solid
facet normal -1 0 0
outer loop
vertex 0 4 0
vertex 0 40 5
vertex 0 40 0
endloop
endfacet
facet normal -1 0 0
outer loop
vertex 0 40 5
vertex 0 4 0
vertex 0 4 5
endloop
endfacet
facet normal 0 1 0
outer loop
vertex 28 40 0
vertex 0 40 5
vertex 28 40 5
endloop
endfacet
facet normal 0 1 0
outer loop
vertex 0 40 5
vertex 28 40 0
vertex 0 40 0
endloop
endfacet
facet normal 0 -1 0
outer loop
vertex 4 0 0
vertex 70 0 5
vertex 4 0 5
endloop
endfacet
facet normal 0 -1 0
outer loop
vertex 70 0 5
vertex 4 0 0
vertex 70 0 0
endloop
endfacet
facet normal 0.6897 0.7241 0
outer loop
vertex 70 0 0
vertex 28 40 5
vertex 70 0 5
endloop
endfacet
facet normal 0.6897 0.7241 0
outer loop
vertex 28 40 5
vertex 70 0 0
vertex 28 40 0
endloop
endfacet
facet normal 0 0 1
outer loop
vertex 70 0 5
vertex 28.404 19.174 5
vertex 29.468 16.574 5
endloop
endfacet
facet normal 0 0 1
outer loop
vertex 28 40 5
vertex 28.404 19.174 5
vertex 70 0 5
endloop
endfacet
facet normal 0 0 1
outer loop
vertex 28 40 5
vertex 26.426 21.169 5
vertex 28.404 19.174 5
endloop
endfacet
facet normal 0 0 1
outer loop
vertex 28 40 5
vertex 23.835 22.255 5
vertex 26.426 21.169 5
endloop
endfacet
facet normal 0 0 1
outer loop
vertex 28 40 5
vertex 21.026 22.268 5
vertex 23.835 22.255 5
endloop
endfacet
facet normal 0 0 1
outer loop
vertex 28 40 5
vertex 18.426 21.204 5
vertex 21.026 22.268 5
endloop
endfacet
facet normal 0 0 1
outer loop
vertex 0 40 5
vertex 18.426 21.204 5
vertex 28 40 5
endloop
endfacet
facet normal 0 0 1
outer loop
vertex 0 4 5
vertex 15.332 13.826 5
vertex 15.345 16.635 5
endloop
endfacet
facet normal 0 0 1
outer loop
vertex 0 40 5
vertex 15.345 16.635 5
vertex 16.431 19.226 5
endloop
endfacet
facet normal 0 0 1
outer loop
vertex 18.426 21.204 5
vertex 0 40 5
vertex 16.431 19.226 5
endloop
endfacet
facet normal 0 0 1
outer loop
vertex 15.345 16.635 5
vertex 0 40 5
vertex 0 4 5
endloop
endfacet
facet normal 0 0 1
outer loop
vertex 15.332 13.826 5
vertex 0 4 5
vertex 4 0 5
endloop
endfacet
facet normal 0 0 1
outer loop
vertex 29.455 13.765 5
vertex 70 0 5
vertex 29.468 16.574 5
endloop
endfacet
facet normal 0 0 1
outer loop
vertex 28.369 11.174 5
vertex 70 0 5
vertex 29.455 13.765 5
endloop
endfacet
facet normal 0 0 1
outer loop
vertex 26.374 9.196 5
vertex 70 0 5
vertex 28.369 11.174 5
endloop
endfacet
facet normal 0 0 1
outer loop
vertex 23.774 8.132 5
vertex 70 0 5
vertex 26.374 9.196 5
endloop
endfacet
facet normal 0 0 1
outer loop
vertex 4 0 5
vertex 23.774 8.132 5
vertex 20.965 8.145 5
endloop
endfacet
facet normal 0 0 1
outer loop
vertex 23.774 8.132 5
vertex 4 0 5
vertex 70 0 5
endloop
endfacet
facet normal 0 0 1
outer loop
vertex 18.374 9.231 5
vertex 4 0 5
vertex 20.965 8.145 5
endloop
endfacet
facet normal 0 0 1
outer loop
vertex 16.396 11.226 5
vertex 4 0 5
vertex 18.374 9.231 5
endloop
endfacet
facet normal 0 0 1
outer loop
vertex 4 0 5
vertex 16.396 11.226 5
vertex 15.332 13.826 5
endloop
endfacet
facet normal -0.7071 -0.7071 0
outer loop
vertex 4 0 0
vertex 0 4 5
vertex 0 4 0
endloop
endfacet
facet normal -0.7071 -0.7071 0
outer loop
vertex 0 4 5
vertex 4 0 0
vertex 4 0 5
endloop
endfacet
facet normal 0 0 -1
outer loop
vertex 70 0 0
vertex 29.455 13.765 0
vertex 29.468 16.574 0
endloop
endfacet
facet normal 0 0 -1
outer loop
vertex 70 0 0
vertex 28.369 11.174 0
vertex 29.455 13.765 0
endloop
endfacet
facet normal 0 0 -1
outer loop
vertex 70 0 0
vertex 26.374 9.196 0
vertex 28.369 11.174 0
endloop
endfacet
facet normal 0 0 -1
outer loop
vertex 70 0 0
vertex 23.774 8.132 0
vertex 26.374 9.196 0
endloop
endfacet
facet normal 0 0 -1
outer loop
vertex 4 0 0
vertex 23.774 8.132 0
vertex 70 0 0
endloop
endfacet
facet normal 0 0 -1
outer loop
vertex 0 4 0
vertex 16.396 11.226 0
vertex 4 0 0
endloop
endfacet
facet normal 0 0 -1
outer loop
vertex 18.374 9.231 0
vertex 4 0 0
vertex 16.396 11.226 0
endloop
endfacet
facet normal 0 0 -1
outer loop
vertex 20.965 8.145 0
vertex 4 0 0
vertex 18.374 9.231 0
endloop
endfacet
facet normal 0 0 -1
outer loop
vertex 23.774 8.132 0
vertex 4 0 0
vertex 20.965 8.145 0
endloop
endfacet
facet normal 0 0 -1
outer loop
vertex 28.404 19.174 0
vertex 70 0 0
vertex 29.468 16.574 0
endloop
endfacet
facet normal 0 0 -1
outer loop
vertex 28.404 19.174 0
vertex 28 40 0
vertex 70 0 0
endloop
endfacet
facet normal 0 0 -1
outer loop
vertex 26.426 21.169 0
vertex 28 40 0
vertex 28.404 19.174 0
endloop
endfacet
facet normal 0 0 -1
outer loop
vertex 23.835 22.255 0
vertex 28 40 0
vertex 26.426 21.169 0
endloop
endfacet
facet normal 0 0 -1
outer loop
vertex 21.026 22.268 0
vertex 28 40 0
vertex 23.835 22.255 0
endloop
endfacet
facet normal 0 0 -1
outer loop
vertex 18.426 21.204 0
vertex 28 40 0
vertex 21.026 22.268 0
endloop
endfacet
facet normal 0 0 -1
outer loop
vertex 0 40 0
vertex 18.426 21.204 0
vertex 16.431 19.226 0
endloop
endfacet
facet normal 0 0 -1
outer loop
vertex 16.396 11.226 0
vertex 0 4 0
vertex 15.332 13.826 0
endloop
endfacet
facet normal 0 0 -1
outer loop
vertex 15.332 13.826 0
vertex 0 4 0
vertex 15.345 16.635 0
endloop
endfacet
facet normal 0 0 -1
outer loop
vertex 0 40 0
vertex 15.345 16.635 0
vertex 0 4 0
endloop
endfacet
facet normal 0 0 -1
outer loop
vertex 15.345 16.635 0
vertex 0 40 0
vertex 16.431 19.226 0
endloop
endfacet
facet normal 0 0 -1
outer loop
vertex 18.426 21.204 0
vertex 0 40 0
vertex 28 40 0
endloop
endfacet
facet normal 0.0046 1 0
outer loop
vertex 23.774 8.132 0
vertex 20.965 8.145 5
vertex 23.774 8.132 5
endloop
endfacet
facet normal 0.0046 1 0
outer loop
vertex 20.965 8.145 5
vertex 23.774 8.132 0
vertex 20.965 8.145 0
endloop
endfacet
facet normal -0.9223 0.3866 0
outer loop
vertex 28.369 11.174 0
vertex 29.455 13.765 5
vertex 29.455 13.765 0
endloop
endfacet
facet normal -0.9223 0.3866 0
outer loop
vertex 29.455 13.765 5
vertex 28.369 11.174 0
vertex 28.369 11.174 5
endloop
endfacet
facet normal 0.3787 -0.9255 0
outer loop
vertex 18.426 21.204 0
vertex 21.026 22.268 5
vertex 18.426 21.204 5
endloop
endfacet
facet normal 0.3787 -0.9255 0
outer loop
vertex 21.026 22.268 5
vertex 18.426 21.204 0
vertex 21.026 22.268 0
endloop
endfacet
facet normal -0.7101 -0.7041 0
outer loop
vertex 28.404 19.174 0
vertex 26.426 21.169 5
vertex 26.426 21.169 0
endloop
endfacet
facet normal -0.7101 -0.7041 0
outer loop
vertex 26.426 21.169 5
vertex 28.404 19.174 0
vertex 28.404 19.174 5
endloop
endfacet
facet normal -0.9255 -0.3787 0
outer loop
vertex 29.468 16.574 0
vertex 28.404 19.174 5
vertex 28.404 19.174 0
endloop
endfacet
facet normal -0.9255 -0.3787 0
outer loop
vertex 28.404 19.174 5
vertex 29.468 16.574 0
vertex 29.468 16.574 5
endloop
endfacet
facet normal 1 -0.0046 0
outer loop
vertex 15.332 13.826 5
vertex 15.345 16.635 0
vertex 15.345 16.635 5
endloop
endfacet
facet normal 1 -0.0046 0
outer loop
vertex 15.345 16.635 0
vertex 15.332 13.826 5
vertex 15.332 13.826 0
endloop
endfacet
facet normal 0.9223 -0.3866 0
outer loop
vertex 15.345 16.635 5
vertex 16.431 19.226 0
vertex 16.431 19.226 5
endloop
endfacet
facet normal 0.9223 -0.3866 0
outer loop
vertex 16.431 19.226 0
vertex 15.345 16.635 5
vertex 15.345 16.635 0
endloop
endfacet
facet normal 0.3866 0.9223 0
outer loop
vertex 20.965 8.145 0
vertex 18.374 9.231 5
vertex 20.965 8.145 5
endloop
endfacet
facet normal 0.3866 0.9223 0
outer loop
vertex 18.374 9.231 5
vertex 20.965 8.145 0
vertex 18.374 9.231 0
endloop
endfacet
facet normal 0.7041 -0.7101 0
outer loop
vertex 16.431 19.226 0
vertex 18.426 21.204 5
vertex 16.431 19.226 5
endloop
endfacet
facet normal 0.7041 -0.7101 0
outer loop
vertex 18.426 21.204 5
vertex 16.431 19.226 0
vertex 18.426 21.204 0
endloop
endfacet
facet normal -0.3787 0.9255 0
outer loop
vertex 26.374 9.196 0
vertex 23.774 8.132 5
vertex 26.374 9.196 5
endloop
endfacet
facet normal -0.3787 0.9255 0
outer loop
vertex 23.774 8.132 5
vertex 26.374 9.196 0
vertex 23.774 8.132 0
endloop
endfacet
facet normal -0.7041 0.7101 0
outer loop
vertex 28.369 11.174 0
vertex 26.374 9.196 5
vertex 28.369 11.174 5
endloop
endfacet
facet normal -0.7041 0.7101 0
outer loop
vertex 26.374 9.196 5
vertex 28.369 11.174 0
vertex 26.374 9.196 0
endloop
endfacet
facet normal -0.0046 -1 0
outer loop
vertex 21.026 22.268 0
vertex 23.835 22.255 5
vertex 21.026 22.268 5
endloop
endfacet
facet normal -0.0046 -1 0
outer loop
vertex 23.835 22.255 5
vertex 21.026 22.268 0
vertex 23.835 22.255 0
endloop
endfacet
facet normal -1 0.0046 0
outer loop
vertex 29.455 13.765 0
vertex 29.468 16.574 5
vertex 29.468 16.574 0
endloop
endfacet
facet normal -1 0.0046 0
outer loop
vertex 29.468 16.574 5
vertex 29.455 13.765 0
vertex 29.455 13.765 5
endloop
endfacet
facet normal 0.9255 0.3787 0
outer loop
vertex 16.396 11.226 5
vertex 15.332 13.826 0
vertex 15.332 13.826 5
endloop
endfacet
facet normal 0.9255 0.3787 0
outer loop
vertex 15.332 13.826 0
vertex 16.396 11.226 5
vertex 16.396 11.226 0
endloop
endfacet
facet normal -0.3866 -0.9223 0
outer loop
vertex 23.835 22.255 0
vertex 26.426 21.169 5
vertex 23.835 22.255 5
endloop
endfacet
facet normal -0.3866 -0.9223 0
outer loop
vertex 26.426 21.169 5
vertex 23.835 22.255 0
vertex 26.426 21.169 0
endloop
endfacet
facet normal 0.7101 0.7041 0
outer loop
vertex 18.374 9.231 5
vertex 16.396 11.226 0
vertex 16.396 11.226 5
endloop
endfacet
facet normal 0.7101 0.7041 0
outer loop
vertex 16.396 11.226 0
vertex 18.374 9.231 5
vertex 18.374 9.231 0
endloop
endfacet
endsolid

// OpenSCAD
$fn = 32;

// ----------------------------------------------------------------------
// Bracket plate: gusset 70 x 40
// ----------------------------------------------------------------------

// --- parameters (mm) ---
hole_r = 4;               // bolt hole radius
plate_t = 5;              // plate thickness, Z (extrusion height)
gus_a = 70;               // base length
gus_b = 40;               // height
top_x = 28;               // top edge X of the angled cut
light_r = 7.2;            // lightening hole radius

light_d = 2 * light_r;

profile = [[4, 0], [35, 0], [70, 0], [28, 40], [0, 40], [0, 4]];  // primary outline, 6 points, counter clockwise
void_1 = [[29.468, 16.574], [28.404, 19.174], [26.426, 21.169], [23.835, 22.255], [21.026, 22.268], [18.426, 21.204], [16.431, 19.226], [15.345, 16.635], [15.332, 13.826], [16.396, 11.226], [18.374, 9.231], [20.965, 8.145], [23.774, 8.132], [26.374, 9.196], [28.369, 11.174], [29.455, 13.765]];  // lightening hole, 16 points

// --- the one profile operation ---
difference() {
  linear_extrude(height = plate_t) polygon(points = profile);
  translate([0, 0, -1])
    linear_extrude(height = plate_t + 2) polygon(points = void_1);
}
